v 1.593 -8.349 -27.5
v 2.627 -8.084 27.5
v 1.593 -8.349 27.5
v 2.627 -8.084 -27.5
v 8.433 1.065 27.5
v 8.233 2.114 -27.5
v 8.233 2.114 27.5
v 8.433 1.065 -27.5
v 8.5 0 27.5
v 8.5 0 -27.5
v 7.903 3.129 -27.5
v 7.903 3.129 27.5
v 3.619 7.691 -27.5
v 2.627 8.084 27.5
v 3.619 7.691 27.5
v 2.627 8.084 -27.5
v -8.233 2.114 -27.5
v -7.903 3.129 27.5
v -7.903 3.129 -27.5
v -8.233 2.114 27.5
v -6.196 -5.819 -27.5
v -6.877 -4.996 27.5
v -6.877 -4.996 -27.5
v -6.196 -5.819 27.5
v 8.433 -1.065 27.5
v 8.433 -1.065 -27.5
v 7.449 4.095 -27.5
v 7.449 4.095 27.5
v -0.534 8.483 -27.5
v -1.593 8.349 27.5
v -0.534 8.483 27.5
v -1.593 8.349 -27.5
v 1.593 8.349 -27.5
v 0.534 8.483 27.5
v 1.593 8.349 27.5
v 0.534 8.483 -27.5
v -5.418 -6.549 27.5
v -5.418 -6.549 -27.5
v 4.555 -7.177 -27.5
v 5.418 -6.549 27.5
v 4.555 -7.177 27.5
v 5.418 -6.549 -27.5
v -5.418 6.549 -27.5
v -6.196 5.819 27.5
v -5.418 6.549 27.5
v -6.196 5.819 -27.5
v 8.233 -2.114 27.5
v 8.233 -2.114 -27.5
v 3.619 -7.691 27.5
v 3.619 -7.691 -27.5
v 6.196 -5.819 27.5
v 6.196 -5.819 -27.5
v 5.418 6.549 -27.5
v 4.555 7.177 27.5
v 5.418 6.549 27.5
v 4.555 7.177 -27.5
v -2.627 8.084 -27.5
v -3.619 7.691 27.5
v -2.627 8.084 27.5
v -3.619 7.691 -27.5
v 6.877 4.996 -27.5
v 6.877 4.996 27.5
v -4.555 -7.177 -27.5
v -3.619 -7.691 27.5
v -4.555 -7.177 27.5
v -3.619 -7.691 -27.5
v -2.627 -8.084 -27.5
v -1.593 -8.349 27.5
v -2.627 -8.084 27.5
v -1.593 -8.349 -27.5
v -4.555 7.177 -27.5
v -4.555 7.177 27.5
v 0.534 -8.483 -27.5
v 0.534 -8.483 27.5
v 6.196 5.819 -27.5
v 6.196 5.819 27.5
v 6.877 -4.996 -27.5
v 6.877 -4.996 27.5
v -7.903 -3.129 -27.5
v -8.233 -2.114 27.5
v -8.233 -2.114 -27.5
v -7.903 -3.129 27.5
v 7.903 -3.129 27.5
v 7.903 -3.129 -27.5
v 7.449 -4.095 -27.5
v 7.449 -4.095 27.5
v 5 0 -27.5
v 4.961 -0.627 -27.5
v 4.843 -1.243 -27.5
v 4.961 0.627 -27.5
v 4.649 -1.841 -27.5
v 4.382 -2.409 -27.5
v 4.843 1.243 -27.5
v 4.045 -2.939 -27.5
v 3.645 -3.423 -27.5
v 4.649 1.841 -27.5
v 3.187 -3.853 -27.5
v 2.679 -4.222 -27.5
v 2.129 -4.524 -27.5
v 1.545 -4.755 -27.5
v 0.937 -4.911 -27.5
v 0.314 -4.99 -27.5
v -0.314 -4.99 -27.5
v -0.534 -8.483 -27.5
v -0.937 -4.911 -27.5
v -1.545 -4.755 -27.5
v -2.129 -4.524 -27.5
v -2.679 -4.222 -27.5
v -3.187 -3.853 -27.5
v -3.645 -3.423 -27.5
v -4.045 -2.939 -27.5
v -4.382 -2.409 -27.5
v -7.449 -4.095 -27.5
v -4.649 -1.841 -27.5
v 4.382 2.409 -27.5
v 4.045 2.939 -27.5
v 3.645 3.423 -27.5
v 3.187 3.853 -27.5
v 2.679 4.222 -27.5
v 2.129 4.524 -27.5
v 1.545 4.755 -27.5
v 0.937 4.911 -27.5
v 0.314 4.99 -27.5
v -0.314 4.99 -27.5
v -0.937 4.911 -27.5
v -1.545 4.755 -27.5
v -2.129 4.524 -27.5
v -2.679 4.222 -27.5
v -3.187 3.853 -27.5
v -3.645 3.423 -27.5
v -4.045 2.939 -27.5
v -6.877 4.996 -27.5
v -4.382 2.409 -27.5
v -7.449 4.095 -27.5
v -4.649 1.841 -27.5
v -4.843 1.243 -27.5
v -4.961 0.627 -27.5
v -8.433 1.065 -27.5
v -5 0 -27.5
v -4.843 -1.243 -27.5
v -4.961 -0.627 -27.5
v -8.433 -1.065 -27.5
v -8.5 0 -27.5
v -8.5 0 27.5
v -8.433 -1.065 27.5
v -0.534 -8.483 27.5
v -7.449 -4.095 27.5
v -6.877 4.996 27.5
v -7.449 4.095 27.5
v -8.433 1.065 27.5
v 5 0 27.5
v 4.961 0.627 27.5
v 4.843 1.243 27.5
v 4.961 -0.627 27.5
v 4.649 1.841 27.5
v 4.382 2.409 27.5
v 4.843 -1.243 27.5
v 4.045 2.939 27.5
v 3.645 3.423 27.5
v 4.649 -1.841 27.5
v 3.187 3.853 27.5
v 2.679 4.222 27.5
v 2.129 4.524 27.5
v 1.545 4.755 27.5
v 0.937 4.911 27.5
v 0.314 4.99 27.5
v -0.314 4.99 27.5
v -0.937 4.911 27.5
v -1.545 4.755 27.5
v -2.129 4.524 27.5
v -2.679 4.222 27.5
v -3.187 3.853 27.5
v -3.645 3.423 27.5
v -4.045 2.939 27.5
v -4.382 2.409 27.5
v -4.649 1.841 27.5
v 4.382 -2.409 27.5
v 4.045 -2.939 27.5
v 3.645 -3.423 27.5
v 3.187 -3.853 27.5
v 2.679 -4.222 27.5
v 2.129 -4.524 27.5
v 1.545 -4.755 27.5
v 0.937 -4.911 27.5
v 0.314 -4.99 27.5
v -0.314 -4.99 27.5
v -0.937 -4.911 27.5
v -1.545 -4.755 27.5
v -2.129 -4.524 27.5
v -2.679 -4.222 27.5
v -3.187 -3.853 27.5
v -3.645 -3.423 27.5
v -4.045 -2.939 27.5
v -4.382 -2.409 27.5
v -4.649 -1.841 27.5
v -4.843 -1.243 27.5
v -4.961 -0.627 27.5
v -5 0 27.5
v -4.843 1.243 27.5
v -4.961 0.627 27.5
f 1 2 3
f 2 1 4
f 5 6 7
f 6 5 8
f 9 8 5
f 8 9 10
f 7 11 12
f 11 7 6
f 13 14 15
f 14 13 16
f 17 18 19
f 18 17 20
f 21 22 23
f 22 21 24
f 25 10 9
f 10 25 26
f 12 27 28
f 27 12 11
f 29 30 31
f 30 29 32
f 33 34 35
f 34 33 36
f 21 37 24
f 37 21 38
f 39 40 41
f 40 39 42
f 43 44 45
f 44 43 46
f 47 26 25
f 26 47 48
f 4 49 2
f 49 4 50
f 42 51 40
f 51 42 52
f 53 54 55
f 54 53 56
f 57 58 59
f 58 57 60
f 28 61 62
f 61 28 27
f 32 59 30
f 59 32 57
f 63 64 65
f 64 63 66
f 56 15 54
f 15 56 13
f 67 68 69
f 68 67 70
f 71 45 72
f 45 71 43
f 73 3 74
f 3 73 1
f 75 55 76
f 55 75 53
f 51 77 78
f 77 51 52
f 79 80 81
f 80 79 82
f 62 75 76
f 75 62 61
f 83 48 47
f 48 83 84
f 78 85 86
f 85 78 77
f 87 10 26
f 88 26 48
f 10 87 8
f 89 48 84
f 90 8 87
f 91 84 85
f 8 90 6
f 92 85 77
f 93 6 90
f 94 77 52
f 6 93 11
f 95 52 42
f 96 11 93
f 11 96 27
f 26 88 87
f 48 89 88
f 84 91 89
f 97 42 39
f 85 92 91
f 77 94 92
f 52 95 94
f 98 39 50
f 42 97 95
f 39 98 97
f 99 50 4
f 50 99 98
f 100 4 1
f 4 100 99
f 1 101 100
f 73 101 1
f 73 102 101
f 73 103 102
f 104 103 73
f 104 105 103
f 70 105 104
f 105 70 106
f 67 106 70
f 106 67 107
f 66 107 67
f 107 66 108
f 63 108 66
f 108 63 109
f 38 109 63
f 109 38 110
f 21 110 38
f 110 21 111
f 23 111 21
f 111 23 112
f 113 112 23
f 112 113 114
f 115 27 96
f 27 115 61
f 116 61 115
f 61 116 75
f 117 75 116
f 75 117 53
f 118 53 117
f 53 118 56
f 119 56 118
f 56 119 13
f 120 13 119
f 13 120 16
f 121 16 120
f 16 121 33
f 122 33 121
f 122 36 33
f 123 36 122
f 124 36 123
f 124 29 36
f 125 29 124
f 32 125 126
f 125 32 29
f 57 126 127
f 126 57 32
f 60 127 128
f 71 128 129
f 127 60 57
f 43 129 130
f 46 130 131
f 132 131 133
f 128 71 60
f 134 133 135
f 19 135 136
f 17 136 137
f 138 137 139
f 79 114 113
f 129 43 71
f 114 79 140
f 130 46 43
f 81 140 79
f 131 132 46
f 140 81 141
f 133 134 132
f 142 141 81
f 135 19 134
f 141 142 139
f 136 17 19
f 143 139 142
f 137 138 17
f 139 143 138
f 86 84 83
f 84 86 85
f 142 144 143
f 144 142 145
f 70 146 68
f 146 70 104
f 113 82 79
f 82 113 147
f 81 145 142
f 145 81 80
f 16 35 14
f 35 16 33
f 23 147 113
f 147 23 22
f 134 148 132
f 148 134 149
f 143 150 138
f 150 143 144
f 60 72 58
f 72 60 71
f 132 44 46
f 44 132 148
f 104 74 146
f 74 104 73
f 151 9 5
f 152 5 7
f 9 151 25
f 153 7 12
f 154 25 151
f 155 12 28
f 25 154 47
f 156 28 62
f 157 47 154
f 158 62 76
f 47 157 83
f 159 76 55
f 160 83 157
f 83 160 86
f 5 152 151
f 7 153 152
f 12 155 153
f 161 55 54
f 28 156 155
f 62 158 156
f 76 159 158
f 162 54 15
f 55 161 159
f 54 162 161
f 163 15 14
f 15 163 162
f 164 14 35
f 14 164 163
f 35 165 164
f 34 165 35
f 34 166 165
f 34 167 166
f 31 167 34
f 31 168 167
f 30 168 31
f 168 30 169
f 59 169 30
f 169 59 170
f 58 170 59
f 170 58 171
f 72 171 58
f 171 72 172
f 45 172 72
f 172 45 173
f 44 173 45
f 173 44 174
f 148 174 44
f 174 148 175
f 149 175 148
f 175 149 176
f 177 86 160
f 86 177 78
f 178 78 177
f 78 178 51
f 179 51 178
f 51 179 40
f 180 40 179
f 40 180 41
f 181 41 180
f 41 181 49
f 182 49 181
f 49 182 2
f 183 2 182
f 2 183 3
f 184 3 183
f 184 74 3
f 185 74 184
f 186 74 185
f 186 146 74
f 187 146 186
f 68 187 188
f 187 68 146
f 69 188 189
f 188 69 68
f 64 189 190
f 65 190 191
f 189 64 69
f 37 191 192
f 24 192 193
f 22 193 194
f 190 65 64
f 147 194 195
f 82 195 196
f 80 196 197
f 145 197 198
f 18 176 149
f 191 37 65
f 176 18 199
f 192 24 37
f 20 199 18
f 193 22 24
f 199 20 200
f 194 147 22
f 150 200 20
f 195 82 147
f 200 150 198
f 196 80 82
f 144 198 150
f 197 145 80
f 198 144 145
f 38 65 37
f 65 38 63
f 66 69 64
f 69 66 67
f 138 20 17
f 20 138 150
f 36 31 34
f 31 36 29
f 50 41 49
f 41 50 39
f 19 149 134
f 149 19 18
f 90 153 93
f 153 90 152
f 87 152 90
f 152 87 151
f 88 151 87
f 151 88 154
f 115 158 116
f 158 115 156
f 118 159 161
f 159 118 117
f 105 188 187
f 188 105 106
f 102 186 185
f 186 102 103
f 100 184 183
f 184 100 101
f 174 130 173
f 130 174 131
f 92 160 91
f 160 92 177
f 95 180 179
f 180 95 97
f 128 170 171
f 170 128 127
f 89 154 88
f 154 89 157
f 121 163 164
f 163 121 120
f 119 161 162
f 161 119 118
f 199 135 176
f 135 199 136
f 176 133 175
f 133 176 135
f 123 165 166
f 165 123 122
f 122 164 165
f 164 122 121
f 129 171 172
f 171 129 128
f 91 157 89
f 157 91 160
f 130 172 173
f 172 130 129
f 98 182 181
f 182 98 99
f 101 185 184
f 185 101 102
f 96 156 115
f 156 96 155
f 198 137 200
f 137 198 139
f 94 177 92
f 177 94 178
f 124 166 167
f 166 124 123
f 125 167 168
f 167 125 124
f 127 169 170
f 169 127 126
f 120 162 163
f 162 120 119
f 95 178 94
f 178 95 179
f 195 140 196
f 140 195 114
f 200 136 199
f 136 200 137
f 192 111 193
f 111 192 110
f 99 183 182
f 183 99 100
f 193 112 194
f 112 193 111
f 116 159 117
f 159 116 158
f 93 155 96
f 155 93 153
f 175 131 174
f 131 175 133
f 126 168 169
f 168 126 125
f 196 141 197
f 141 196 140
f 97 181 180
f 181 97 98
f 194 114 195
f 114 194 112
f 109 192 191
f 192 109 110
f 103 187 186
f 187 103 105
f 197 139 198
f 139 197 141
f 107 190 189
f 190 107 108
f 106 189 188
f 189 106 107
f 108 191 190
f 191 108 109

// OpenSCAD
$fn = 50;


difference() {
	union() {
		translate(v = [0, 0, -27.5000000000]) {
			cylinder(h = 55, r = 8.5000000000);
		}
	}
	union() {
		translate(v = [0, 0, -100.0000000000]) {
			cylinder(h = 200, r = 5.0000000000);
		}
	}
}
